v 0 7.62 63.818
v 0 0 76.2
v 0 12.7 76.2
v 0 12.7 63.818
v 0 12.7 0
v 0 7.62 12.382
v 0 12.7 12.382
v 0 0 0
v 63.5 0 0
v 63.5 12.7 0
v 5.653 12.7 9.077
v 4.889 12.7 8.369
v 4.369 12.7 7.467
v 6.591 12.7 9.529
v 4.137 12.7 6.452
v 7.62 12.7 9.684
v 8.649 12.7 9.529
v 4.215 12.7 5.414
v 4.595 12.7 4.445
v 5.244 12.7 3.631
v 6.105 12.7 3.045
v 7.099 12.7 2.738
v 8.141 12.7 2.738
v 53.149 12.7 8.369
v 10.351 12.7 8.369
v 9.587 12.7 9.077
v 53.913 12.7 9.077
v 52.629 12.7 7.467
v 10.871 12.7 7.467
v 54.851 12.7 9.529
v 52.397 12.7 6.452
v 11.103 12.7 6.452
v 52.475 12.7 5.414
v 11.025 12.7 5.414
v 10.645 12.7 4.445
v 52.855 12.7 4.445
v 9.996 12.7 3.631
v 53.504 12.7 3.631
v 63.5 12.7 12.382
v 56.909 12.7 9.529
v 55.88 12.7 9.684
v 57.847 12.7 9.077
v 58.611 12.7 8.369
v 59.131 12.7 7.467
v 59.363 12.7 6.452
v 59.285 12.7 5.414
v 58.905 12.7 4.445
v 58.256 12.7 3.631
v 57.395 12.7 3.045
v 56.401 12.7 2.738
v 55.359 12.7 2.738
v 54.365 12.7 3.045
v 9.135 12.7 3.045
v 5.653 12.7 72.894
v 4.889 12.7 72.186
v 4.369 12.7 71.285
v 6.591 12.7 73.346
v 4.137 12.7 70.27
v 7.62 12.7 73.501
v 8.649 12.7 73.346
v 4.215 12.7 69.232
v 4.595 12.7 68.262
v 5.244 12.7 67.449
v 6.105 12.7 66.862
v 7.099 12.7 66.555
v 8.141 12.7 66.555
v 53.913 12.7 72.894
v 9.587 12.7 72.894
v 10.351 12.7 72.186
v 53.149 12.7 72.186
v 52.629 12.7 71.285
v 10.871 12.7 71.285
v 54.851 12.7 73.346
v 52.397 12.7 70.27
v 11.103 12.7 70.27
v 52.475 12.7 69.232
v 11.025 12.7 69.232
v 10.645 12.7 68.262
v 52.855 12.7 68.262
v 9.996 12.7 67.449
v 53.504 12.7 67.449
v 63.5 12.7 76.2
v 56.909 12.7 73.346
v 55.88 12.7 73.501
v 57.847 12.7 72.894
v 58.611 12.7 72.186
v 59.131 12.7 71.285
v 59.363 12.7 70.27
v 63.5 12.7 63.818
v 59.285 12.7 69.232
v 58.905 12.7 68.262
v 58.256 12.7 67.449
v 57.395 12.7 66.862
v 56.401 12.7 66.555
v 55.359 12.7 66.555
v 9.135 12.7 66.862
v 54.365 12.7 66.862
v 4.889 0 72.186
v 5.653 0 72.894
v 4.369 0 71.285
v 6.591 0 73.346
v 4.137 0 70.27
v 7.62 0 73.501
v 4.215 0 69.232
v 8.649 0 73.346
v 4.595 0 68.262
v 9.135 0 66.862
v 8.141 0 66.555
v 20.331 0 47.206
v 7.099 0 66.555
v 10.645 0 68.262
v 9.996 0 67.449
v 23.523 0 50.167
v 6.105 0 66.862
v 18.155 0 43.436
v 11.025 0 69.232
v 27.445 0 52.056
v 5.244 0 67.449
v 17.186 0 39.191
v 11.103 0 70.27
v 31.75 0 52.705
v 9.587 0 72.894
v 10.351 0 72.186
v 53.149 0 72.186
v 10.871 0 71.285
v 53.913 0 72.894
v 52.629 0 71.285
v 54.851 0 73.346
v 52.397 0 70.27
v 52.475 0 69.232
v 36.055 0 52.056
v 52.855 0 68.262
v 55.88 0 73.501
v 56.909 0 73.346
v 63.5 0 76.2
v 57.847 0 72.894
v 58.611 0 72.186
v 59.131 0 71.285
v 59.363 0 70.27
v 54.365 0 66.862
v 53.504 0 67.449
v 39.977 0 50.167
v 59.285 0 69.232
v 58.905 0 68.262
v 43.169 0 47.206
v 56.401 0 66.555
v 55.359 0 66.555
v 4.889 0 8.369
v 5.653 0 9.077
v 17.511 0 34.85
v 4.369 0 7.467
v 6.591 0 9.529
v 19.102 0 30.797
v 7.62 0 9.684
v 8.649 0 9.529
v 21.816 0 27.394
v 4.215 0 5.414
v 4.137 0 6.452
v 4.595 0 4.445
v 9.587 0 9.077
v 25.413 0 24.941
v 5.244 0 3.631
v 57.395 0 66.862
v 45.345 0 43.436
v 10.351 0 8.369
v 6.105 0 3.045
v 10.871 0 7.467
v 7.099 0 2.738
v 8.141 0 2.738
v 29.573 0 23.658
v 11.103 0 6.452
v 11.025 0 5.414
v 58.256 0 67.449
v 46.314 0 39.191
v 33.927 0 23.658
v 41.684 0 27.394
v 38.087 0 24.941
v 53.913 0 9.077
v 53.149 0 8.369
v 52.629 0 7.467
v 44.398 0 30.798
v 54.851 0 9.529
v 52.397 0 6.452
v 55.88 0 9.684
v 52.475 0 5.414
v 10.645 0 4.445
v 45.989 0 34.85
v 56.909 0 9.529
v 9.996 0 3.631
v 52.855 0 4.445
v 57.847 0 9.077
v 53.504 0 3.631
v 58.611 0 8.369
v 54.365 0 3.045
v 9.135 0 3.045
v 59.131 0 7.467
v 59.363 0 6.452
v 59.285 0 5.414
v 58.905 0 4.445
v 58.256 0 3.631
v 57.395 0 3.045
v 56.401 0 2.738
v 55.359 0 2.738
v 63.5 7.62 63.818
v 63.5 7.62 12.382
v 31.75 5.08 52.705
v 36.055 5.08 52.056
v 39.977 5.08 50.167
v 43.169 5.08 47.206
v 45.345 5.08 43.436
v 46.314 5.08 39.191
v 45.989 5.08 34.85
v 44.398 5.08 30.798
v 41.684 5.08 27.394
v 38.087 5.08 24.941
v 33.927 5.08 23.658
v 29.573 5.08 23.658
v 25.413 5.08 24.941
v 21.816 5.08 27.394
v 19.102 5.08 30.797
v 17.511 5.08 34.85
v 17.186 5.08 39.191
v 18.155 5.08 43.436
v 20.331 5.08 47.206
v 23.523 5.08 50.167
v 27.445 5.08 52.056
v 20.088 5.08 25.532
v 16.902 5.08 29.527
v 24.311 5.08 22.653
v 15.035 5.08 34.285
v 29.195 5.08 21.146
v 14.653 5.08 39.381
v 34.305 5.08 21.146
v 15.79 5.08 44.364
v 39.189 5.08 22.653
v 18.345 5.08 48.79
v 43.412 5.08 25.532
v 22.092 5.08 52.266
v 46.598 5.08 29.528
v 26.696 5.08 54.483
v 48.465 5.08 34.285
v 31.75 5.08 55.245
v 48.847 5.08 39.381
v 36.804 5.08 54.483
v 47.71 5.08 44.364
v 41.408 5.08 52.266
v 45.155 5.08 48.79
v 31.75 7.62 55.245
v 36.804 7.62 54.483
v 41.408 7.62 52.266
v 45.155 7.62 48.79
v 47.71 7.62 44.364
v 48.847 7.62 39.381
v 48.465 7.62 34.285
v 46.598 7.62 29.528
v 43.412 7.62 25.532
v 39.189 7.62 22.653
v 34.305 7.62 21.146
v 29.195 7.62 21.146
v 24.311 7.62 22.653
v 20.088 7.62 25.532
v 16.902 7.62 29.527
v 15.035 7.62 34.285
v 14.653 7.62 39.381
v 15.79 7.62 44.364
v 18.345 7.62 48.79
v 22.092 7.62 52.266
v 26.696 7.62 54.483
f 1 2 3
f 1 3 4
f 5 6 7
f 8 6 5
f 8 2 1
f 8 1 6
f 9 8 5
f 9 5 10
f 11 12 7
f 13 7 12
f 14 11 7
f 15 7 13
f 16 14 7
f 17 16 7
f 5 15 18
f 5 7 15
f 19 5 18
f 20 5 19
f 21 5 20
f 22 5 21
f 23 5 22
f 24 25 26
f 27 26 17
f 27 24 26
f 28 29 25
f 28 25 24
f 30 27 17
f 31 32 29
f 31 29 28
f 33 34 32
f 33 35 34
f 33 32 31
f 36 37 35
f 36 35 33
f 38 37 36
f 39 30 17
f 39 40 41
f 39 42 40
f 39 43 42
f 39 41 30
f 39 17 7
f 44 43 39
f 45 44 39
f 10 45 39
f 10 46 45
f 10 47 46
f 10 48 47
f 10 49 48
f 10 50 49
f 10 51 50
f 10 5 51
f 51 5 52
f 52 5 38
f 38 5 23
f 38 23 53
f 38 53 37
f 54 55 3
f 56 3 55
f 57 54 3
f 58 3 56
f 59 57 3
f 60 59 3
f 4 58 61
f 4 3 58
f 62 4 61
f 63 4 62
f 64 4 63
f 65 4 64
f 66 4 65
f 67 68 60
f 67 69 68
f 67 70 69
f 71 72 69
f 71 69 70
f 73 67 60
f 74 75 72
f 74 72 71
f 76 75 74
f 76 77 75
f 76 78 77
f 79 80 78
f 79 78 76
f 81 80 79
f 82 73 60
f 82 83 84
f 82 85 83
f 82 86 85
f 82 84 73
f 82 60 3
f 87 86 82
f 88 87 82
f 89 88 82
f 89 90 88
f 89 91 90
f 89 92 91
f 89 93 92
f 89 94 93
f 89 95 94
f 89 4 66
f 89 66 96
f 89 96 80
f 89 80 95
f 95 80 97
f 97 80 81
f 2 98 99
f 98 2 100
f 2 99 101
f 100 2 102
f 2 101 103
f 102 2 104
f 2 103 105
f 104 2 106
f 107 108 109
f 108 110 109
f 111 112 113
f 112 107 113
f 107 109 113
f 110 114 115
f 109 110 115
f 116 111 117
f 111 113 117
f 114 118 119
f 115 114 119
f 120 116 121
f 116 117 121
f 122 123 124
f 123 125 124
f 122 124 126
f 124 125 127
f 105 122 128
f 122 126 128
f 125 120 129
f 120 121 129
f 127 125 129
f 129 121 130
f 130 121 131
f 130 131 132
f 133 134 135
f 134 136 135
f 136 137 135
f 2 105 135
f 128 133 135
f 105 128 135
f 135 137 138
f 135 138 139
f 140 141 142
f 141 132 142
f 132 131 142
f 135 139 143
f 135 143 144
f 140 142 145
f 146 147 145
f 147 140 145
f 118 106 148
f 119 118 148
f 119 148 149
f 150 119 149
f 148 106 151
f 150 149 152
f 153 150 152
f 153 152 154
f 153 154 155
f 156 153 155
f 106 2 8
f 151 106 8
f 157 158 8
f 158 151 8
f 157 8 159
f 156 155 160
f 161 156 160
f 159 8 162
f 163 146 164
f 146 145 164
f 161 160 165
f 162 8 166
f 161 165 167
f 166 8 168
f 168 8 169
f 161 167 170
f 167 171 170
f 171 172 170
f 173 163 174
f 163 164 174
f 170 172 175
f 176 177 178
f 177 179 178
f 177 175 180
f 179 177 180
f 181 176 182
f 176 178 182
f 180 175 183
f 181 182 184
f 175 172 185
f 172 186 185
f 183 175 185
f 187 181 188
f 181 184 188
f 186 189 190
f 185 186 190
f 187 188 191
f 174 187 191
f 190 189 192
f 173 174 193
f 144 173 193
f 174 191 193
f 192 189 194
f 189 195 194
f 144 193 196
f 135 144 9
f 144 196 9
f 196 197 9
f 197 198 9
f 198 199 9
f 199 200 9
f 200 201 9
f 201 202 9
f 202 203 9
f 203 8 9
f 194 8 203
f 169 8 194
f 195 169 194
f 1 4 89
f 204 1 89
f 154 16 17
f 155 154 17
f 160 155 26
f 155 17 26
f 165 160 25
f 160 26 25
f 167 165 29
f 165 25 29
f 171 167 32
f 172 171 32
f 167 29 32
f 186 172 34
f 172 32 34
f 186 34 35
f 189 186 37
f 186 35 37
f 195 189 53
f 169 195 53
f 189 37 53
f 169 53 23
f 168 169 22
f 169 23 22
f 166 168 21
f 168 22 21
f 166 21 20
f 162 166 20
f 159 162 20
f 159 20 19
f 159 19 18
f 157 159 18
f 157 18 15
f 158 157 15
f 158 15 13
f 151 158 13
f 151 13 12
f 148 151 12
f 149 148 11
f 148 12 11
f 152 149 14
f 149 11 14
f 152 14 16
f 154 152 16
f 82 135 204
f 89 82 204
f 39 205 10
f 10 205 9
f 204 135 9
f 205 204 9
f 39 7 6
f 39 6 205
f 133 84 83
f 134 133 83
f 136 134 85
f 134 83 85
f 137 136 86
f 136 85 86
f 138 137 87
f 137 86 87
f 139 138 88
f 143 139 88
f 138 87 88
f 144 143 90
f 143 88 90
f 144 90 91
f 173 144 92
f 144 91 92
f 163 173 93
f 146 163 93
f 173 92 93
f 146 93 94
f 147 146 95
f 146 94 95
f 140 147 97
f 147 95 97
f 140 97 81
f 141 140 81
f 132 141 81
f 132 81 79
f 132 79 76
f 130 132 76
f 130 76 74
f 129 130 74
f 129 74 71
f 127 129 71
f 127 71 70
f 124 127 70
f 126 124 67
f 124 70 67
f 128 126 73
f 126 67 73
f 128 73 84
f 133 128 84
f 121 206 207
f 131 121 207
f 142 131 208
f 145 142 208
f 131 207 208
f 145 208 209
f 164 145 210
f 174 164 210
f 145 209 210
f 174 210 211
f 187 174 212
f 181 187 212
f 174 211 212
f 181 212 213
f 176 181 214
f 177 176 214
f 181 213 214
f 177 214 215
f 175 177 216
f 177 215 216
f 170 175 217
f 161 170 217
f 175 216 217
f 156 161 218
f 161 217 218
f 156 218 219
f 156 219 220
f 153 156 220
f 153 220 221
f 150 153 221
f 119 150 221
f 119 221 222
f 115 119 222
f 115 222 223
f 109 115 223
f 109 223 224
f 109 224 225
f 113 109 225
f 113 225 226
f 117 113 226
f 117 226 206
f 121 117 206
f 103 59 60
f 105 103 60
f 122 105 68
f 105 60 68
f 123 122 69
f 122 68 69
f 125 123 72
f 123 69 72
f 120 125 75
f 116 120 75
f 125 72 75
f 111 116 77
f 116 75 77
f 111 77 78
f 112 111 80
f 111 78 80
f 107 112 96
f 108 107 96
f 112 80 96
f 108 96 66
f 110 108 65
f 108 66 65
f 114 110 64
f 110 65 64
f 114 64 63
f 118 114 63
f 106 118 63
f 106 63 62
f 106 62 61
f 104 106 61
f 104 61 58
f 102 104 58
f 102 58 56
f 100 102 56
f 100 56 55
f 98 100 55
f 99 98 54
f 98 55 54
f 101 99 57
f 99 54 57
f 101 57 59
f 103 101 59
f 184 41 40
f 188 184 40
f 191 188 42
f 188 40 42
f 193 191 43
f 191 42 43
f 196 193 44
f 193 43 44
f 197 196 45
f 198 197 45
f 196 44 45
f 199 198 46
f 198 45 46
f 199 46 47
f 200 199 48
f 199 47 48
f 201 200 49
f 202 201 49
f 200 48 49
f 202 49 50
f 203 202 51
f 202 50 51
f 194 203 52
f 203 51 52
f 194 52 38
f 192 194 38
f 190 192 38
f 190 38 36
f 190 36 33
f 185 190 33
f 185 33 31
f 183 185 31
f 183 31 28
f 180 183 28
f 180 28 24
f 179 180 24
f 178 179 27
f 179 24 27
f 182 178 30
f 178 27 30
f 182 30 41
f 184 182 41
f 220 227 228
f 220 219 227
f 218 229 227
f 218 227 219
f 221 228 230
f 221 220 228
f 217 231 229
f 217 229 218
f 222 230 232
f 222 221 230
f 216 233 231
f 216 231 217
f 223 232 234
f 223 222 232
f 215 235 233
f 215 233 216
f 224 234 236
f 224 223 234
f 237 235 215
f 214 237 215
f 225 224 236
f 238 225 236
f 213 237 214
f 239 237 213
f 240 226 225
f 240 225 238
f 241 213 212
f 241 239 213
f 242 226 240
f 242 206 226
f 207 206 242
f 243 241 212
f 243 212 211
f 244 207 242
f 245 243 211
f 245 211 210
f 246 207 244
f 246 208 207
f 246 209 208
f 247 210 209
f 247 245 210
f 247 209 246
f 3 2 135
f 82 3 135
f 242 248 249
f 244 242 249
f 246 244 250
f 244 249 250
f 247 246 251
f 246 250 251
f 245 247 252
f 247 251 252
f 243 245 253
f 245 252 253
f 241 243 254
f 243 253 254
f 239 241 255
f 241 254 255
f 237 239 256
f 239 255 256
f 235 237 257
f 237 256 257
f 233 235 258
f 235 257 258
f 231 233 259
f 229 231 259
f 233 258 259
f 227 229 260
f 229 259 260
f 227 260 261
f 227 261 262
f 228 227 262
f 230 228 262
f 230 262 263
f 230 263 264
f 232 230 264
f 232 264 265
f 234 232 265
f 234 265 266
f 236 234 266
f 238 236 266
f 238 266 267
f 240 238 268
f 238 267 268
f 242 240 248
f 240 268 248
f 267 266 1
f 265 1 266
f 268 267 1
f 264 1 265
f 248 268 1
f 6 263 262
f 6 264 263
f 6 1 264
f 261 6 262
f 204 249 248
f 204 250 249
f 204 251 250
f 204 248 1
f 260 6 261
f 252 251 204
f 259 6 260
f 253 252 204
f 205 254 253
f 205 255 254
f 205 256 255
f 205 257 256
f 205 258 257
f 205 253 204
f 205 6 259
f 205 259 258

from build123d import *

# Parameters (mm, degrees)
SKETCH1_W           = 63.5
SKETCH1_H           = 76.2
BOSS_EXTRUDE1_DEPTH = 12.7
SKETCH2_W           = 63.5
SKETCH2_H           = 51.435
CUT_EXTRUDE1_DEPTH  = 5.08
SKETCH3_R           = 14.605
CUT_EXTRUDE2_DEPTH  = 7.62
SKETCH4_R           = 3.4925
CUT_EXTRUDE4_DEPTH  = 12.7
SKETCH6_R           = 17.145
CUT_EXTRUDE6_DEPTH  = 2.54


with BuildPart() as part:
    # Sketch1 → Boss-Extrude1 (new body)
    with BuildSketch(Plane(origin=(0, 0, 0), x_dir=(1, 0, 0), z_dir=(0, 1, 0))):
        with Locations((31.75, -38.1)):
            Rectangle(SKETCH1_W, SKETCH1_H)
    extrude(amount=BOSS_EXTRUDE1_DEPTH)

    # Sketch2 → Cut-Extrude1 (cut)
    with BuildSketch(Plane(origin=(0, 12.7, 0), x_dir=(1, 0, 0), z_dir=(0, 1, 0))):
        with Locations((31.75, -38.1)):
            Rectangle(SKETCH2_W, SKETCH2_H)
    extrude(amount=-CUT_EXTRUDE1_DEPTH, mode=Mode.SUBTRACT)

    # Sketch3 → Cut-Extrude2 (cut)
    with BuildSketch(Plane(origin=(0, 7.62, 0), x_dir=(1, 0, 0), z_dir=(0, 1, 0))):
        with Locations(Location((31.75, -38.1, 0), (0, 0, 270))):
            Circle(SKETCH3_R)
    extrude(amount=-CUT_EXTRUDE2_DEPTH, mode=Mode.SUBTRACT)

    # Sketch4 → Cut-Extrude4 (cut)
    with BuildSketch(Plane(origin=(0, 12.7, 0), x_dir=(1, 0, 0), z_dir=(0, 1, 0))):
        with Locations(Location((7.62, -6.19125, 0), (0, 0, 270))):
            Circle(SKETCH4_R)
        with Locations(Location((55.88, -6.19125, 0), (0, 0, 270))):
            Circle(SKETCH4_R)
        with Locations(Location((7.62, -70.00875, 0), (0, 0, 270))):
            Circle(SKETCH4_R)
        with Locations(Location((55.88, -70.00875, 0), (0, 0, 270))):
            Circle(SKETCH4_R)
    extrude(amount=-CUT_EXTRUDE4_DEPTH, mode=Mode.SUBTRACT)

    # Sketch6 → Cut-Extrude6 (cut)
    with BuildSketch(Plane(origin=(0, 7.62, 0), x_dir=(1, 0, 0), z_dir=(0, 1, 0))):
        with Locations(Location((31.75, -38.1, 0), (0, 0, 270))):
            Circle(SKETCH6_R)
    extrude(amount=-CUT_EXTRUDE6_DEPTH, mode=Mode.SUBTRACT)


solid = part.part
